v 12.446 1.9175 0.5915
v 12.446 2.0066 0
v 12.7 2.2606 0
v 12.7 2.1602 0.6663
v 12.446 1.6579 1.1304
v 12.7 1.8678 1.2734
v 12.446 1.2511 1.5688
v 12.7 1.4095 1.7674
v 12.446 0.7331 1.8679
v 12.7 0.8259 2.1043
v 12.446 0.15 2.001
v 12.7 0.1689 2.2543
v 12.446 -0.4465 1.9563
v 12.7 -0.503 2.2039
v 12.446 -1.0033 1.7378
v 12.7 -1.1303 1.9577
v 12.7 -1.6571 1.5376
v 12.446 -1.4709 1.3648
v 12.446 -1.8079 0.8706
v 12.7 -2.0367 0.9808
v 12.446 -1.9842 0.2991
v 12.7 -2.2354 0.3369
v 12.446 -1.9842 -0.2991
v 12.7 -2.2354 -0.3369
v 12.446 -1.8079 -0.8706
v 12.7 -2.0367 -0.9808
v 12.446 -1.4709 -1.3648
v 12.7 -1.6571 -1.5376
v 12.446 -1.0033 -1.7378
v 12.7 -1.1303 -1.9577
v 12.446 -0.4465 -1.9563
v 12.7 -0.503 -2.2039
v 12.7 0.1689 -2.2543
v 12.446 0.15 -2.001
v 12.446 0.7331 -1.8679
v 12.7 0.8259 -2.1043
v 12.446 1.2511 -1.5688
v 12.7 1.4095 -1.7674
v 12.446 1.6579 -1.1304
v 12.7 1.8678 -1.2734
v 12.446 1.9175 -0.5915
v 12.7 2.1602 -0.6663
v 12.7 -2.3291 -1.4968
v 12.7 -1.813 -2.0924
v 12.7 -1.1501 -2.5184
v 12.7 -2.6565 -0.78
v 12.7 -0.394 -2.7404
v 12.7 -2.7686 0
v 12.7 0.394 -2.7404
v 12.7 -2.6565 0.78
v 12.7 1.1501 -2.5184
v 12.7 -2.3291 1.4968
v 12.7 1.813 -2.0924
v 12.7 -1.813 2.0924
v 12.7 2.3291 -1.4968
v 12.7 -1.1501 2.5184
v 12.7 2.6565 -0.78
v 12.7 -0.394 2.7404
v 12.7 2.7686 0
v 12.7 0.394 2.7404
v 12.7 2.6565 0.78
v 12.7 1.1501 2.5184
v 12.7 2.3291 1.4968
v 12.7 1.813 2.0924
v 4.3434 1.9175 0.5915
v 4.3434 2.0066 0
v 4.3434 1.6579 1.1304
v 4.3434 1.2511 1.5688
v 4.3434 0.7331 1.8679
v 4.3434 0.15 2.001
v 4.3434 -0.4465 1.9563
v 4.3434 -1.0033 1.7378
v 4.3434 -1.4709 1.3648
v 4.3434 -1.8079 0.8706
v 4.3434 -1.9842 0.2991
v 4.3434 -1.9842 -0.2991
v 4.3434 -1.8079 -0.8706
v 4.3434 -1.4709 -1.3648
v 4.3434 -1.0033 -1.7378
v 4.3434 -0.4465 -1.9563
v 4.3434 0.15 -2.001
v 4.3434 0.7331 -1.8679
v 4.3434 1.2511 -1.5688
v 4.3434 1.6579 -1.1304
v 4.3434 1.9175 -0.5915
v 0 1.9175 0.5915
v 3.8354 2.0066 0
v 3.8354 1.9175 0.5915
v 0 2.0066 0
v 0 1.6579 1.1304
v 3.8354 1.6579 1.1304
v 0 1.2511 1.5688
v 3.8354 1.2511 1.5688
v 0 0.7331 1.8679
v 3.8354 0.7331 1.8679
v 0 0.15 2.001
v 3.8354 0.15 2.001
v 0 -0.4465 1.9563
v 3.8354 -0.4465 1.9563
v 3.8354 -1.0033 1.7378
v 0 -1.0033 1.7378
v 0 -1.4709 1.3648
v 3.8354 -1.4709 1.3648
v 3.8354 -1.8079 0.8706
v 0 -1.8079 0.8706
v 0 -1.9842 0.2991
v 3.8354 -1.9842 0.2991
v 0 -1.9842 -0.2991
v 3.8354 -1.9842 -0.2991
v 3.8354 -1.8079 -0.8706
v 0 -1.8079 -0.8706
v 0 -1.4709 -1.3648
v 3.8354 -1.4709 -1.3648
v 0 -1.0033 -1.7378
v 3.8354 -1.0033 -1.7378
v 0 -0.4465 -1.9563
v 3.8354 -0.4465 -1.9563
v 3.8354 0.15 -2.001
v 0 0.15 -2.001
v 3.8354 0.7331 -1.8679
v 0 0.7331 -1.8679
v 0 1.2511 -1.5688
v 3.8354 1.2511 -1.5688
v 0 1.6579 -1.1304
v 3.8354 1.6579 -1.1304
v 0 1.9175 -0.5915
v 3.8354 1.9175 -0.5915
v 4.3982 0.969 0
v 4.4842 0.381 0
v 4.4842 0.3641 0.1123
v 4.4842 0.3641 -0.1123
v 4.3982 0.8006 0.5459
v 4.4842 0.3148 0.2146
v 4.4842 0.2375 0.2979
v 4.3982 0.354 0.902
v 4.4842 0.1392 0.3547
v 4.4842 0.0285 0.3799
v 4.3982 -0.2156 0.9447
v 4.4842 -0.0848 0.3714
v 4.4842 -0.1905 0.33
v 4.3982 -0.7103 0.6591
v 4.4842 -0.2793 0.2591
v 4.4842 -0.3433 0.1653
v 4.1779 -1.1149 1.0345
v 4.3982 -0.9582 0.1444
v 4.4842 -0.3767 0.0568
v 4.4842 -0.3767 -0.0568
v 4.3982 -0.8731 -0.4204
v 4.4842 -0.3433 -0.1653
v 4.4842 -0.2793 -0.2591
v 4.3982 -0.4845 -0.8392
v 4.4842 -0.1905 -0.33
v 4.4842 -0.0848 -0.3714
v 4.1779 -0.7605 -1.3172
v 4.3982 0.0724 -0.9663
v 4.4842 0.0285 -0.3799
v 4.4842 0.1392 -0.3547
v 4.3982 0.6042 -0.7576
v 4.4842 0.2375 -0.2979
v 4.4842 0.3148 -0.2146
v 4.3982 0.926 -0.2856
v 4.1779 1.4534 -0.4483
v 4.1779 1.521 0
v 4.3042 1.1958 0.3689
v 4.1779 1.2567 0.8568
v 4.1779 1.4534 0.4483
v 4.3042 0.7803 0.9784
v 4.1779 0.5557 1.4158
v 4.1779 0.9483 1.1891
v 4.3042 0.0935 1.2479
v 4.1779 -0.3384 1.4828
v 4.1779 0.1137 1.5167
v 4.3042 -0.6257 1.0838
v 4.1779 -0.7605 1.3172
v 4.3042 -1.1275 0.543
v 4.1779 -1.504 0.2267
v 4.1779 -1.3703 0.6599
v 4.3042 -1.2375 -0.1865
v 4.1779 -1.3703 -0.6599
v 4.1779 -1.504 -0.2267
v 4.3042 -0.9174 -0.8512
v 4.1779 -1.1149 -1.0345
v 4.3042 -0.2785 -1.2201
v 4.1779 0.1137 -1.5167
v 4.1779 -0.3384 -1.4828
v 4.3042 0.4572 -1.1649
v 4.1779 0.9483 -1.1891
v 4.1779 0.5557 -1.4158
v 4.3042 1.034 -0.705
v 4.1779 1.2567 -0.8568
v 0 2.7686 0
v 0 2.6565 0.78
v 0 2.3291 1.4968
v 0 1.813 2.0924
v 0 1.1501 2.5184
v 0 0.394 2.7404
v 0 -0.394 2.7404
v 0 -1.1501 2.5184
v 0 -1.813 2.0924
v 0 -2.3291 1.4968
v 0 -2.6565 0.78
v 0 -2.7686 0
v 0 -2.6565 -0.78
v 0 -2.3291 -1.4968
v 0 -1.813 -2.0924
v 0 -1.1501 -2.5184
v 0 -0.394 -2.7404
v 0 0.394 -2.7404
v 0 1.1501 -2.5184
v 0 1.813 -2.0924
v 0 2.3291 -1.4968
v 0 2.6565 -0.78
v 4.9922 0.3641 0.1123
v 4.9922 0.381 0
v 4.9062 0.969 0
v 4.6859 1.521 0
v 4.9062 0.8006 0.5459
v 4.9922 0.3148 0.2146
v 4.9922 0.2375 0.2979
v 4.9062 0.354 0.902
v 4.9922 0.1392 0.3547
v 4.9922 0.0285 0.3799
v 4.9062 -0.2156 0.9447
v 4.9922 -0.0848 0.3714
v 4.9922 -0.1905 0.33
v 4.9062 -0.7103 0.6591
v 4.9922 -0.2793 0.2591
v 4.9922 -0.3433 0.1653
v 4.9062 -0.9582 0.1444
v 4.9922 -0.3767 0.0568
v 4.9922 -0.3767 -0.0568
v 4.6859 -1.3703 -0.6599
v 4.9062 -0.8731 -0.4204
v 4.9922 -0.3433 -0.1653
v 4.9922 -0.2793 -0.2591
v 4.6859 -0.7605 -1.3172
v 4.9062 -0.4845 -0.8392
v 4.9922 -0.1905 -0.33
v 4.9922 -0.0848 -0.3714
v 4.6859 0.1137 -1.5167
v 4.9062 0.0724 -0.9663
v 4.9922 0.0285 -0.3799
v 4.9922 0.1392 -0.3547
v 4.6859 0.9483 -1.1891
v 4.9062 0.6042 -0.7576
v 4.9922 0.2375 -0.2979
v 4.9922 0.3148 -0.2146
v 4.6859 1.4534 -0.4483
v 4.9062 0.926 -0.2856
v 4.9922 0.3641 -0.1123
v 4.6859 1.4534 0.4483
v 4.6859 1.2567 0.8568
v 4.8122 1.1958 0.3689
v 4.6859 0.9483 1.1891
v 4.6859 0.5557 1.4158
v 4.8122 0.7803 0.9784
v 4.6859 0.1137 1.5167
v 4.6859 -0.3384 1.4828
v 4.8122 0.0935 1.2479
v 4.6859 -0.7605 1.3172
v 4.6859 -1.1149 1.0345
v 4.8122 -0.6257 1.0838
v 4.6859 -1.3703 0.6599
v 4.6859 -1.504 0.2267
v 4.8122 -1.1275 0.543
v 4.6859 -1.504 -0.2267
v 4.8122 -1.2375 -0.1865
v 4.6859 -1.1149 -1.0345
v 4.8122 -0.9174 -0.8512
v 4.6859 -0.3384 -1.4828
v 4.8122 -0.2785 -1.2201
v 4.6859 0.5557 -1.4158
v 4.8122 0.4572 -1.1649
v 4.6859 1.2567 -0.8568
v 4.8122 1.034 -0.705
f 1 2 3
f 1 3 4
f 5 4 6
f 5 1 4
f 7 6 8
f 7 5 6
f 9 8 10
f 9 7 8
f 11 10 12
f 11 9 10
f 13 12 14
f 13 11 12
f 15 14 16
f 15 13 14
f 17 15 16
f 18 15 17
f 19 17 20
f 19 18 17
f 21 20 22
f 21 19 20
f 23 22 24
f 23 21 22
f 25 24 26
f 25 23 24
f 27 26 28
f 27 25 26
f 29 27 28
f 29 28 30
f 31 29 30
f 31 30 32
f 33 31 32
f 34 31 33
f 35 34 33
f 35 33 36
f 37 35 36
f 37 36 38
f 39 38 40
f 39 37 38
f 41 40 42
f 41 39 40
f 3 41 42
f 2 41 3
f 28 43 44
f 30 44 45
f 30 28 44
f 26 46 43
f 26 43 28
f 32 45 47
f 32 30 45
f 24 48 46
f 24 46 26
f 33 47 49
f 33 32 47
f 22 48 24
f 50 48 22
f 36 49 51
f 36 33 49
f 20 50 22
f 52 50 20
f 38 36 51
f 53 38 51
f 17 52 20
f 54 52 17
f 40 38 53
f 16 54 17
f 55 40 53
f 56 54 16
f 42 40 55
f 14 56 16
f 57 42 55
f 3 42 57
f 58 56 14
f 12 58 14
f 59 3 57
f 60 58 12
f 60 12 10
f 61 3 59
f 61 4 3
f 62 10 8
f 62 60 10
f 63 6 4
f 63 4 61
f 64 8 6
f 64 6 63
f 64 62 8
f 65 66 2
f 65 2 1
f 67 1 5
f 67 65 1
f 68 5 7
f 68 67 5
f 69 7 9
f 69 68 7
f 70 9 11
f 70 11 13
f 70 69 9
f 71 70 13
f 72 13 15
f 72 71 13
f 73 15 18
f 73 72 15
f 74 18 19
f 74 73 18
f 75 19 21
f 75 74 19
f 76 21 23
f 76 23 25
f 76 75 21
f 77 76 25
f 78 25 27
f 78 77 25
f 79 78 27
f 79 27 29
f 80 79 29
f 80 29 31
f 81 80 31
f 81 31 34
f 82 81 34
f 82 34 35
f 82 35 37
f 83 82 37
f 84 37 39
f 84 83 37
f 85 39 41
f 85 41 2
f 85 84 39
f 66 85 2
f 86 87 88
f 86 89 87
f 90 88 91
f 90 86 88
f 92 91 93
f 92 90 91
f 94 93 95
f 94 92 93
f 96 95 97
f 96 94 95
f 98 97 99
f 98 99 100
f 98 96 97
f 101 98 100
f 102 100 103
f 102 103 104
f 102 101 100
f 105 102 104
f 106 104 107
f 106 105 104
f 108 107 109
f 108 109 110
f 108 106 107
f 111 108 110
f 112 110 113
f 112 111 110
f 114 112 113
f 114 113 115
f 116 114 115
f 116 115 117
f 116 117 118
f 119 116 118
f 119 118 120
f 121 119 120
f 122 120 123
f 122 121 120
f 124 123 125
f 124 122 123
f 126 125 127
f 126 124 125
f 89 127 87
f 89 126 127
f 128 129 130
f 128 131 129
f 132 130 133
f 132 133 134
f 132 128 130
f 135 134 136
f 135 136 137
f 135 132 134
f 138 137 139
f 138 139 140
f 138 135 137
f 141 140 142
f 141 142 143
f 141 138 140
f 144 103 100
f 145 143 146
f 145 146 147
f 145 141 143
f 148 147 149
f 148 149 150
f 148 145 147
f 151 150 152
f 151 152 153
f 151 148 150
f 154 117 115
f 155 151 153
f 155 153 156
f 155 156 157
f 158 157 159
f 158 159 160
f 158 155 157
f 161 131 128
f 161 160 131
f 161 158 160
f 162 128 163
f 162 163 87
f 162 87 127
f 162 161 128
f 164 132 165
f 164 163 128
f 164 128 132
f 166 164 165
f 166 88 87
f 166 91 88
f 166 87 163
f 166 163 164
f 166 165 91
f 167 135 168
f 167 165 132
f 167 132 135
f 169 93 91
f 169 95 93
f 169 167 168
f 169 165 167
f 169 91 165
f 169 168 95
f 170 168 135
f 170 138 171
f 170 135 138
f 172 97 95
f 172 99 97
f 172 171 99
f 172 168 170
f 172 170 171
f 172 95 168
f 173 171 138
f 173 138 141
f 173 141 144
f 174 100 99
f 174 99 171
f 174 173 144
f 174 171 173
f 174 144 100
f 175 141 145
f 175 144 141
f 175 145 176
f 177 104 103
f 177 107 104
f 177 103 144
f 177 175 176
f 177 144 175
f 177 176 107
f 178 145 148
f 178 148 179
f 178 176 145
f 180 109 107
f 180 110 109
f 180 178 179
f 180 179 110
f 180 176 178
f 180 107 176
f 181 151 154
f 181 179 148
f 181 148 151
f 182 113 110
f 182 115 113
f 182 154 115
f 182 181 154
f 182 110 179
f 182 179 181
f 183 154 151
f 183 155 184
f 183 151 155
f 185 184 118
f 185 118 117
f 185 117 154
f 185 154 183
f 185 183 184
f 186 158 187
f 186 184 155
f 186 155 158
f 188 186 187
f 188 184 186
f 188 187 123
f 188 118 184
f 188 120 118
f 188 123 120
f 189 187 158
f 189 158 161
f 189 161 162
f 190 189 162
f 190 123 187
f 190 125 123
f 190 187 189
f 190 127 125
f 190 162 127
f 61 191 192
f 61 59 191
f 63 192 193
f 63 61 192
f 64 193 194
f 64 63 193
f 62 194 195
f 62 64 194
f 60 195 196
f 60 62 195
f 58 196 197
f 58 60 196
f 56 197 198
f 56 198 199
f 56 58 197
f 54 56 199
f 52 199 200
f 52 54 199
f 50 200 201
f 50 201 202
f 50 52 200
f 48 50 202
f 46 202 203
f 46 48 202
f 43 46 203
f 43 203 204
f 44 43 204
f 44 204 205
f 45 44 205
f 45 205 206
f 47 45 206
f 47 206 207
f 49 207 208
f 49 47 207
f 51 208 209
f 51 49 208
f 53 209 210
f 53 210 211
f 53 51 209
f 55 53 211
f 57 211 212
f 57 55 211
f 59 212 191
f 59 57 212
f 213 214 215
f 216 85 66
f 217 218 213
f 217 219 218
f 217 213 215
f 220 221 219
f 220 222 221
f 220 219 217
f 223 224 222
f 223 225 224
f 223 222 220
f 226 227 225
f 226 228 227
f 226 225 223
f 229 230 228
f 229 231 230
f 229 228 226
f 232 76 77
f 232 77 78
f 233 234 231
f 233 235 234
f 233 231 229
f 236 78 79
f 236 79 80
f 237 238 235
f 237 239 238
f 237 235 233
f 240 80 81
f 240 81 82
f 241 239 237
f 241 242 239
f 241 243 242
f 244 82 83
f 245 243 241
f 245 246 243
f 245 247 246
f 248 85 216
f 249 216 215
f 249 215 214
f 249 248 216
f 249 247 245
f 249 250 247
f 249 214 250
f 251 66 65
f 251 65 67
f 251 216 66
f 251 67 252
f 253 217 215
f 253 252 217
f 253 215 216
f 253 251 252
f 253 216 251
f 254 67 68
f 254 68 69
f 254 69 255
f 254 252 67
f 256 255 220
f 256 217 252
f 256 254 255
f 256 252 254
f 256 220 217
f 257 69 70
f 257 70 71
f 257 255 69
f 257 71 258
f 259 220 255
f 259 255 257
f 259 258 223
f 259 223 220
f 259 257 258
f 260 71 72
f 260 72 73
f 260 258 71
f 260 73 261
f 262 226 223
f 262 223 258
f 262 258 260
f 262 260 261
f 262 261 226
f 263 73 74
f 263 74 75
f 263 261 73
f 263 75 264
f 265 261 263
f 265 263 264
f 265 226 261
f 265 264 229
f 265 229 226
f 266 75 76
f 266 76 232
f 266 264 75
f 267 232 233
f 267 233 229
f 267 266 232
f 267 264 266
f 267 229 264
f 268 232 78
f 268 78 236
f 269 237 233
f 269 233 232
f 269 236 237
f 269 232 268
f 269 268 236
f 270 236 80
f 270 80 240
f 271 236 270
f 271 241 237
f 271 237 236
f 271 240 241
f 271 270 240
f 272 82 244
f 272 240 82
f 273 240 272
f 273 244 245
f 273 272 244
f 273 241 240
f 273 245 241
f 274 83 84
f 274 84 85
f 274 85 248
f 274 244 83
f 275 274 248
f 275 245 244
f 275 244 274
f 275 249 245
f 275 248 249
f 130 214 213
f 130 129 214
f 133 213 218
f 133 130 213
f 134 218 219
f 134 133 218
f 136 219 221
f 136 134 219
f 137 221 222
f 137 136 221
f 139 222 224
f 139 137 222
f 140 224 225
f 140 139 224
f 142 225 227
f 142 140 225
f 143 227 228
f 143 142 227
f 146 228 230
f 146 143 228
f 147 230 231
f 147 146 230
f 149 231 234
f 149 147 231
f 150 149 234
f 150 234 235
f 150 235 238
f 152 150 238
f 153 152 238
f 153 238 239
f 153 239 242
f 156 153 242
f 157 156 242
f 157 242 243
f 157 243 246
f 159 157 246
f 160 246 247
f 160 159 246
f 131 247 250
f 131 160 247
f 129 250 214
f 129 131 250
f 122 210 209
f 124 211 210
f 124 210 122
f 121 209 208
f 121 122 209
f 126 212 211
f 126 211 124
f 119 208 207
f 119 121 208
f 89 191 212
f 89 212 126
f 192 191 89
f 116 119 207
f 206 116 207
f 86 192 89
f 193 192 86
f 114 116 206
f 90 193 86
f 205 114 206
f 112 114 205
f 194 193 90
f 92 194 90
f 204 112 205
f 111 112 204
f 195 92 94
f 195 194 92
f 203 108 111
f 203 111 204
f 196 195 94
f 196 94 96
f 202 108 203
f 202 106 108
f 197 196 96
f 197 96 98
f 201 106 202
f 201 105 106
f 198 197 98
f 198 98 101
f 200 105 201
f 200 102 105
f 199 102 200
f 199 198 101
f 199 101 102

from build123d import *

# Parameters (mm, degrees)
CHAMFER1_SIZE = 0.254


with BuildPart() as part:
    # Sketch1 → Revolve1 (revolve)
    with BuildSketch(Plane.XY):
        with BuildLine():
            Line((0, 2.7686), (12.7, 2.7686))
            Line((12.7, 2.7686), (12.7, 2.0066))
            Line((12.7, 2.0066), (4.3434, 2.0066))
            ThreePointArc((4.3434, 2.0066), (4.81222687, 1.251446675), (4.992165092, 0.381))
            Line((4.992165092, 0.381), (4.484165092, 0.381))
            ThreePointArc((4.484165092, 0.381), (4.30422687, 1.251446675), (3.8354, 2.0066))
            Line((3.8354, 2.0066), (0, 2.0066))
            Line((0, 2.0066), (0, 2.7686))
        make_face()
    revolve(axis=Axis((-4.561757333, 0, 0), (1, 0, 0)))

    # Chamfer1
    chamfer1_edges = [part.edges().sort_by_distance(p)[0] for p in [
        (12.7, -2.0066, 0),
    ]]
    chamfer(chamfer1_edges, length=CHAMFER1_SIZE)


solid = part.part
